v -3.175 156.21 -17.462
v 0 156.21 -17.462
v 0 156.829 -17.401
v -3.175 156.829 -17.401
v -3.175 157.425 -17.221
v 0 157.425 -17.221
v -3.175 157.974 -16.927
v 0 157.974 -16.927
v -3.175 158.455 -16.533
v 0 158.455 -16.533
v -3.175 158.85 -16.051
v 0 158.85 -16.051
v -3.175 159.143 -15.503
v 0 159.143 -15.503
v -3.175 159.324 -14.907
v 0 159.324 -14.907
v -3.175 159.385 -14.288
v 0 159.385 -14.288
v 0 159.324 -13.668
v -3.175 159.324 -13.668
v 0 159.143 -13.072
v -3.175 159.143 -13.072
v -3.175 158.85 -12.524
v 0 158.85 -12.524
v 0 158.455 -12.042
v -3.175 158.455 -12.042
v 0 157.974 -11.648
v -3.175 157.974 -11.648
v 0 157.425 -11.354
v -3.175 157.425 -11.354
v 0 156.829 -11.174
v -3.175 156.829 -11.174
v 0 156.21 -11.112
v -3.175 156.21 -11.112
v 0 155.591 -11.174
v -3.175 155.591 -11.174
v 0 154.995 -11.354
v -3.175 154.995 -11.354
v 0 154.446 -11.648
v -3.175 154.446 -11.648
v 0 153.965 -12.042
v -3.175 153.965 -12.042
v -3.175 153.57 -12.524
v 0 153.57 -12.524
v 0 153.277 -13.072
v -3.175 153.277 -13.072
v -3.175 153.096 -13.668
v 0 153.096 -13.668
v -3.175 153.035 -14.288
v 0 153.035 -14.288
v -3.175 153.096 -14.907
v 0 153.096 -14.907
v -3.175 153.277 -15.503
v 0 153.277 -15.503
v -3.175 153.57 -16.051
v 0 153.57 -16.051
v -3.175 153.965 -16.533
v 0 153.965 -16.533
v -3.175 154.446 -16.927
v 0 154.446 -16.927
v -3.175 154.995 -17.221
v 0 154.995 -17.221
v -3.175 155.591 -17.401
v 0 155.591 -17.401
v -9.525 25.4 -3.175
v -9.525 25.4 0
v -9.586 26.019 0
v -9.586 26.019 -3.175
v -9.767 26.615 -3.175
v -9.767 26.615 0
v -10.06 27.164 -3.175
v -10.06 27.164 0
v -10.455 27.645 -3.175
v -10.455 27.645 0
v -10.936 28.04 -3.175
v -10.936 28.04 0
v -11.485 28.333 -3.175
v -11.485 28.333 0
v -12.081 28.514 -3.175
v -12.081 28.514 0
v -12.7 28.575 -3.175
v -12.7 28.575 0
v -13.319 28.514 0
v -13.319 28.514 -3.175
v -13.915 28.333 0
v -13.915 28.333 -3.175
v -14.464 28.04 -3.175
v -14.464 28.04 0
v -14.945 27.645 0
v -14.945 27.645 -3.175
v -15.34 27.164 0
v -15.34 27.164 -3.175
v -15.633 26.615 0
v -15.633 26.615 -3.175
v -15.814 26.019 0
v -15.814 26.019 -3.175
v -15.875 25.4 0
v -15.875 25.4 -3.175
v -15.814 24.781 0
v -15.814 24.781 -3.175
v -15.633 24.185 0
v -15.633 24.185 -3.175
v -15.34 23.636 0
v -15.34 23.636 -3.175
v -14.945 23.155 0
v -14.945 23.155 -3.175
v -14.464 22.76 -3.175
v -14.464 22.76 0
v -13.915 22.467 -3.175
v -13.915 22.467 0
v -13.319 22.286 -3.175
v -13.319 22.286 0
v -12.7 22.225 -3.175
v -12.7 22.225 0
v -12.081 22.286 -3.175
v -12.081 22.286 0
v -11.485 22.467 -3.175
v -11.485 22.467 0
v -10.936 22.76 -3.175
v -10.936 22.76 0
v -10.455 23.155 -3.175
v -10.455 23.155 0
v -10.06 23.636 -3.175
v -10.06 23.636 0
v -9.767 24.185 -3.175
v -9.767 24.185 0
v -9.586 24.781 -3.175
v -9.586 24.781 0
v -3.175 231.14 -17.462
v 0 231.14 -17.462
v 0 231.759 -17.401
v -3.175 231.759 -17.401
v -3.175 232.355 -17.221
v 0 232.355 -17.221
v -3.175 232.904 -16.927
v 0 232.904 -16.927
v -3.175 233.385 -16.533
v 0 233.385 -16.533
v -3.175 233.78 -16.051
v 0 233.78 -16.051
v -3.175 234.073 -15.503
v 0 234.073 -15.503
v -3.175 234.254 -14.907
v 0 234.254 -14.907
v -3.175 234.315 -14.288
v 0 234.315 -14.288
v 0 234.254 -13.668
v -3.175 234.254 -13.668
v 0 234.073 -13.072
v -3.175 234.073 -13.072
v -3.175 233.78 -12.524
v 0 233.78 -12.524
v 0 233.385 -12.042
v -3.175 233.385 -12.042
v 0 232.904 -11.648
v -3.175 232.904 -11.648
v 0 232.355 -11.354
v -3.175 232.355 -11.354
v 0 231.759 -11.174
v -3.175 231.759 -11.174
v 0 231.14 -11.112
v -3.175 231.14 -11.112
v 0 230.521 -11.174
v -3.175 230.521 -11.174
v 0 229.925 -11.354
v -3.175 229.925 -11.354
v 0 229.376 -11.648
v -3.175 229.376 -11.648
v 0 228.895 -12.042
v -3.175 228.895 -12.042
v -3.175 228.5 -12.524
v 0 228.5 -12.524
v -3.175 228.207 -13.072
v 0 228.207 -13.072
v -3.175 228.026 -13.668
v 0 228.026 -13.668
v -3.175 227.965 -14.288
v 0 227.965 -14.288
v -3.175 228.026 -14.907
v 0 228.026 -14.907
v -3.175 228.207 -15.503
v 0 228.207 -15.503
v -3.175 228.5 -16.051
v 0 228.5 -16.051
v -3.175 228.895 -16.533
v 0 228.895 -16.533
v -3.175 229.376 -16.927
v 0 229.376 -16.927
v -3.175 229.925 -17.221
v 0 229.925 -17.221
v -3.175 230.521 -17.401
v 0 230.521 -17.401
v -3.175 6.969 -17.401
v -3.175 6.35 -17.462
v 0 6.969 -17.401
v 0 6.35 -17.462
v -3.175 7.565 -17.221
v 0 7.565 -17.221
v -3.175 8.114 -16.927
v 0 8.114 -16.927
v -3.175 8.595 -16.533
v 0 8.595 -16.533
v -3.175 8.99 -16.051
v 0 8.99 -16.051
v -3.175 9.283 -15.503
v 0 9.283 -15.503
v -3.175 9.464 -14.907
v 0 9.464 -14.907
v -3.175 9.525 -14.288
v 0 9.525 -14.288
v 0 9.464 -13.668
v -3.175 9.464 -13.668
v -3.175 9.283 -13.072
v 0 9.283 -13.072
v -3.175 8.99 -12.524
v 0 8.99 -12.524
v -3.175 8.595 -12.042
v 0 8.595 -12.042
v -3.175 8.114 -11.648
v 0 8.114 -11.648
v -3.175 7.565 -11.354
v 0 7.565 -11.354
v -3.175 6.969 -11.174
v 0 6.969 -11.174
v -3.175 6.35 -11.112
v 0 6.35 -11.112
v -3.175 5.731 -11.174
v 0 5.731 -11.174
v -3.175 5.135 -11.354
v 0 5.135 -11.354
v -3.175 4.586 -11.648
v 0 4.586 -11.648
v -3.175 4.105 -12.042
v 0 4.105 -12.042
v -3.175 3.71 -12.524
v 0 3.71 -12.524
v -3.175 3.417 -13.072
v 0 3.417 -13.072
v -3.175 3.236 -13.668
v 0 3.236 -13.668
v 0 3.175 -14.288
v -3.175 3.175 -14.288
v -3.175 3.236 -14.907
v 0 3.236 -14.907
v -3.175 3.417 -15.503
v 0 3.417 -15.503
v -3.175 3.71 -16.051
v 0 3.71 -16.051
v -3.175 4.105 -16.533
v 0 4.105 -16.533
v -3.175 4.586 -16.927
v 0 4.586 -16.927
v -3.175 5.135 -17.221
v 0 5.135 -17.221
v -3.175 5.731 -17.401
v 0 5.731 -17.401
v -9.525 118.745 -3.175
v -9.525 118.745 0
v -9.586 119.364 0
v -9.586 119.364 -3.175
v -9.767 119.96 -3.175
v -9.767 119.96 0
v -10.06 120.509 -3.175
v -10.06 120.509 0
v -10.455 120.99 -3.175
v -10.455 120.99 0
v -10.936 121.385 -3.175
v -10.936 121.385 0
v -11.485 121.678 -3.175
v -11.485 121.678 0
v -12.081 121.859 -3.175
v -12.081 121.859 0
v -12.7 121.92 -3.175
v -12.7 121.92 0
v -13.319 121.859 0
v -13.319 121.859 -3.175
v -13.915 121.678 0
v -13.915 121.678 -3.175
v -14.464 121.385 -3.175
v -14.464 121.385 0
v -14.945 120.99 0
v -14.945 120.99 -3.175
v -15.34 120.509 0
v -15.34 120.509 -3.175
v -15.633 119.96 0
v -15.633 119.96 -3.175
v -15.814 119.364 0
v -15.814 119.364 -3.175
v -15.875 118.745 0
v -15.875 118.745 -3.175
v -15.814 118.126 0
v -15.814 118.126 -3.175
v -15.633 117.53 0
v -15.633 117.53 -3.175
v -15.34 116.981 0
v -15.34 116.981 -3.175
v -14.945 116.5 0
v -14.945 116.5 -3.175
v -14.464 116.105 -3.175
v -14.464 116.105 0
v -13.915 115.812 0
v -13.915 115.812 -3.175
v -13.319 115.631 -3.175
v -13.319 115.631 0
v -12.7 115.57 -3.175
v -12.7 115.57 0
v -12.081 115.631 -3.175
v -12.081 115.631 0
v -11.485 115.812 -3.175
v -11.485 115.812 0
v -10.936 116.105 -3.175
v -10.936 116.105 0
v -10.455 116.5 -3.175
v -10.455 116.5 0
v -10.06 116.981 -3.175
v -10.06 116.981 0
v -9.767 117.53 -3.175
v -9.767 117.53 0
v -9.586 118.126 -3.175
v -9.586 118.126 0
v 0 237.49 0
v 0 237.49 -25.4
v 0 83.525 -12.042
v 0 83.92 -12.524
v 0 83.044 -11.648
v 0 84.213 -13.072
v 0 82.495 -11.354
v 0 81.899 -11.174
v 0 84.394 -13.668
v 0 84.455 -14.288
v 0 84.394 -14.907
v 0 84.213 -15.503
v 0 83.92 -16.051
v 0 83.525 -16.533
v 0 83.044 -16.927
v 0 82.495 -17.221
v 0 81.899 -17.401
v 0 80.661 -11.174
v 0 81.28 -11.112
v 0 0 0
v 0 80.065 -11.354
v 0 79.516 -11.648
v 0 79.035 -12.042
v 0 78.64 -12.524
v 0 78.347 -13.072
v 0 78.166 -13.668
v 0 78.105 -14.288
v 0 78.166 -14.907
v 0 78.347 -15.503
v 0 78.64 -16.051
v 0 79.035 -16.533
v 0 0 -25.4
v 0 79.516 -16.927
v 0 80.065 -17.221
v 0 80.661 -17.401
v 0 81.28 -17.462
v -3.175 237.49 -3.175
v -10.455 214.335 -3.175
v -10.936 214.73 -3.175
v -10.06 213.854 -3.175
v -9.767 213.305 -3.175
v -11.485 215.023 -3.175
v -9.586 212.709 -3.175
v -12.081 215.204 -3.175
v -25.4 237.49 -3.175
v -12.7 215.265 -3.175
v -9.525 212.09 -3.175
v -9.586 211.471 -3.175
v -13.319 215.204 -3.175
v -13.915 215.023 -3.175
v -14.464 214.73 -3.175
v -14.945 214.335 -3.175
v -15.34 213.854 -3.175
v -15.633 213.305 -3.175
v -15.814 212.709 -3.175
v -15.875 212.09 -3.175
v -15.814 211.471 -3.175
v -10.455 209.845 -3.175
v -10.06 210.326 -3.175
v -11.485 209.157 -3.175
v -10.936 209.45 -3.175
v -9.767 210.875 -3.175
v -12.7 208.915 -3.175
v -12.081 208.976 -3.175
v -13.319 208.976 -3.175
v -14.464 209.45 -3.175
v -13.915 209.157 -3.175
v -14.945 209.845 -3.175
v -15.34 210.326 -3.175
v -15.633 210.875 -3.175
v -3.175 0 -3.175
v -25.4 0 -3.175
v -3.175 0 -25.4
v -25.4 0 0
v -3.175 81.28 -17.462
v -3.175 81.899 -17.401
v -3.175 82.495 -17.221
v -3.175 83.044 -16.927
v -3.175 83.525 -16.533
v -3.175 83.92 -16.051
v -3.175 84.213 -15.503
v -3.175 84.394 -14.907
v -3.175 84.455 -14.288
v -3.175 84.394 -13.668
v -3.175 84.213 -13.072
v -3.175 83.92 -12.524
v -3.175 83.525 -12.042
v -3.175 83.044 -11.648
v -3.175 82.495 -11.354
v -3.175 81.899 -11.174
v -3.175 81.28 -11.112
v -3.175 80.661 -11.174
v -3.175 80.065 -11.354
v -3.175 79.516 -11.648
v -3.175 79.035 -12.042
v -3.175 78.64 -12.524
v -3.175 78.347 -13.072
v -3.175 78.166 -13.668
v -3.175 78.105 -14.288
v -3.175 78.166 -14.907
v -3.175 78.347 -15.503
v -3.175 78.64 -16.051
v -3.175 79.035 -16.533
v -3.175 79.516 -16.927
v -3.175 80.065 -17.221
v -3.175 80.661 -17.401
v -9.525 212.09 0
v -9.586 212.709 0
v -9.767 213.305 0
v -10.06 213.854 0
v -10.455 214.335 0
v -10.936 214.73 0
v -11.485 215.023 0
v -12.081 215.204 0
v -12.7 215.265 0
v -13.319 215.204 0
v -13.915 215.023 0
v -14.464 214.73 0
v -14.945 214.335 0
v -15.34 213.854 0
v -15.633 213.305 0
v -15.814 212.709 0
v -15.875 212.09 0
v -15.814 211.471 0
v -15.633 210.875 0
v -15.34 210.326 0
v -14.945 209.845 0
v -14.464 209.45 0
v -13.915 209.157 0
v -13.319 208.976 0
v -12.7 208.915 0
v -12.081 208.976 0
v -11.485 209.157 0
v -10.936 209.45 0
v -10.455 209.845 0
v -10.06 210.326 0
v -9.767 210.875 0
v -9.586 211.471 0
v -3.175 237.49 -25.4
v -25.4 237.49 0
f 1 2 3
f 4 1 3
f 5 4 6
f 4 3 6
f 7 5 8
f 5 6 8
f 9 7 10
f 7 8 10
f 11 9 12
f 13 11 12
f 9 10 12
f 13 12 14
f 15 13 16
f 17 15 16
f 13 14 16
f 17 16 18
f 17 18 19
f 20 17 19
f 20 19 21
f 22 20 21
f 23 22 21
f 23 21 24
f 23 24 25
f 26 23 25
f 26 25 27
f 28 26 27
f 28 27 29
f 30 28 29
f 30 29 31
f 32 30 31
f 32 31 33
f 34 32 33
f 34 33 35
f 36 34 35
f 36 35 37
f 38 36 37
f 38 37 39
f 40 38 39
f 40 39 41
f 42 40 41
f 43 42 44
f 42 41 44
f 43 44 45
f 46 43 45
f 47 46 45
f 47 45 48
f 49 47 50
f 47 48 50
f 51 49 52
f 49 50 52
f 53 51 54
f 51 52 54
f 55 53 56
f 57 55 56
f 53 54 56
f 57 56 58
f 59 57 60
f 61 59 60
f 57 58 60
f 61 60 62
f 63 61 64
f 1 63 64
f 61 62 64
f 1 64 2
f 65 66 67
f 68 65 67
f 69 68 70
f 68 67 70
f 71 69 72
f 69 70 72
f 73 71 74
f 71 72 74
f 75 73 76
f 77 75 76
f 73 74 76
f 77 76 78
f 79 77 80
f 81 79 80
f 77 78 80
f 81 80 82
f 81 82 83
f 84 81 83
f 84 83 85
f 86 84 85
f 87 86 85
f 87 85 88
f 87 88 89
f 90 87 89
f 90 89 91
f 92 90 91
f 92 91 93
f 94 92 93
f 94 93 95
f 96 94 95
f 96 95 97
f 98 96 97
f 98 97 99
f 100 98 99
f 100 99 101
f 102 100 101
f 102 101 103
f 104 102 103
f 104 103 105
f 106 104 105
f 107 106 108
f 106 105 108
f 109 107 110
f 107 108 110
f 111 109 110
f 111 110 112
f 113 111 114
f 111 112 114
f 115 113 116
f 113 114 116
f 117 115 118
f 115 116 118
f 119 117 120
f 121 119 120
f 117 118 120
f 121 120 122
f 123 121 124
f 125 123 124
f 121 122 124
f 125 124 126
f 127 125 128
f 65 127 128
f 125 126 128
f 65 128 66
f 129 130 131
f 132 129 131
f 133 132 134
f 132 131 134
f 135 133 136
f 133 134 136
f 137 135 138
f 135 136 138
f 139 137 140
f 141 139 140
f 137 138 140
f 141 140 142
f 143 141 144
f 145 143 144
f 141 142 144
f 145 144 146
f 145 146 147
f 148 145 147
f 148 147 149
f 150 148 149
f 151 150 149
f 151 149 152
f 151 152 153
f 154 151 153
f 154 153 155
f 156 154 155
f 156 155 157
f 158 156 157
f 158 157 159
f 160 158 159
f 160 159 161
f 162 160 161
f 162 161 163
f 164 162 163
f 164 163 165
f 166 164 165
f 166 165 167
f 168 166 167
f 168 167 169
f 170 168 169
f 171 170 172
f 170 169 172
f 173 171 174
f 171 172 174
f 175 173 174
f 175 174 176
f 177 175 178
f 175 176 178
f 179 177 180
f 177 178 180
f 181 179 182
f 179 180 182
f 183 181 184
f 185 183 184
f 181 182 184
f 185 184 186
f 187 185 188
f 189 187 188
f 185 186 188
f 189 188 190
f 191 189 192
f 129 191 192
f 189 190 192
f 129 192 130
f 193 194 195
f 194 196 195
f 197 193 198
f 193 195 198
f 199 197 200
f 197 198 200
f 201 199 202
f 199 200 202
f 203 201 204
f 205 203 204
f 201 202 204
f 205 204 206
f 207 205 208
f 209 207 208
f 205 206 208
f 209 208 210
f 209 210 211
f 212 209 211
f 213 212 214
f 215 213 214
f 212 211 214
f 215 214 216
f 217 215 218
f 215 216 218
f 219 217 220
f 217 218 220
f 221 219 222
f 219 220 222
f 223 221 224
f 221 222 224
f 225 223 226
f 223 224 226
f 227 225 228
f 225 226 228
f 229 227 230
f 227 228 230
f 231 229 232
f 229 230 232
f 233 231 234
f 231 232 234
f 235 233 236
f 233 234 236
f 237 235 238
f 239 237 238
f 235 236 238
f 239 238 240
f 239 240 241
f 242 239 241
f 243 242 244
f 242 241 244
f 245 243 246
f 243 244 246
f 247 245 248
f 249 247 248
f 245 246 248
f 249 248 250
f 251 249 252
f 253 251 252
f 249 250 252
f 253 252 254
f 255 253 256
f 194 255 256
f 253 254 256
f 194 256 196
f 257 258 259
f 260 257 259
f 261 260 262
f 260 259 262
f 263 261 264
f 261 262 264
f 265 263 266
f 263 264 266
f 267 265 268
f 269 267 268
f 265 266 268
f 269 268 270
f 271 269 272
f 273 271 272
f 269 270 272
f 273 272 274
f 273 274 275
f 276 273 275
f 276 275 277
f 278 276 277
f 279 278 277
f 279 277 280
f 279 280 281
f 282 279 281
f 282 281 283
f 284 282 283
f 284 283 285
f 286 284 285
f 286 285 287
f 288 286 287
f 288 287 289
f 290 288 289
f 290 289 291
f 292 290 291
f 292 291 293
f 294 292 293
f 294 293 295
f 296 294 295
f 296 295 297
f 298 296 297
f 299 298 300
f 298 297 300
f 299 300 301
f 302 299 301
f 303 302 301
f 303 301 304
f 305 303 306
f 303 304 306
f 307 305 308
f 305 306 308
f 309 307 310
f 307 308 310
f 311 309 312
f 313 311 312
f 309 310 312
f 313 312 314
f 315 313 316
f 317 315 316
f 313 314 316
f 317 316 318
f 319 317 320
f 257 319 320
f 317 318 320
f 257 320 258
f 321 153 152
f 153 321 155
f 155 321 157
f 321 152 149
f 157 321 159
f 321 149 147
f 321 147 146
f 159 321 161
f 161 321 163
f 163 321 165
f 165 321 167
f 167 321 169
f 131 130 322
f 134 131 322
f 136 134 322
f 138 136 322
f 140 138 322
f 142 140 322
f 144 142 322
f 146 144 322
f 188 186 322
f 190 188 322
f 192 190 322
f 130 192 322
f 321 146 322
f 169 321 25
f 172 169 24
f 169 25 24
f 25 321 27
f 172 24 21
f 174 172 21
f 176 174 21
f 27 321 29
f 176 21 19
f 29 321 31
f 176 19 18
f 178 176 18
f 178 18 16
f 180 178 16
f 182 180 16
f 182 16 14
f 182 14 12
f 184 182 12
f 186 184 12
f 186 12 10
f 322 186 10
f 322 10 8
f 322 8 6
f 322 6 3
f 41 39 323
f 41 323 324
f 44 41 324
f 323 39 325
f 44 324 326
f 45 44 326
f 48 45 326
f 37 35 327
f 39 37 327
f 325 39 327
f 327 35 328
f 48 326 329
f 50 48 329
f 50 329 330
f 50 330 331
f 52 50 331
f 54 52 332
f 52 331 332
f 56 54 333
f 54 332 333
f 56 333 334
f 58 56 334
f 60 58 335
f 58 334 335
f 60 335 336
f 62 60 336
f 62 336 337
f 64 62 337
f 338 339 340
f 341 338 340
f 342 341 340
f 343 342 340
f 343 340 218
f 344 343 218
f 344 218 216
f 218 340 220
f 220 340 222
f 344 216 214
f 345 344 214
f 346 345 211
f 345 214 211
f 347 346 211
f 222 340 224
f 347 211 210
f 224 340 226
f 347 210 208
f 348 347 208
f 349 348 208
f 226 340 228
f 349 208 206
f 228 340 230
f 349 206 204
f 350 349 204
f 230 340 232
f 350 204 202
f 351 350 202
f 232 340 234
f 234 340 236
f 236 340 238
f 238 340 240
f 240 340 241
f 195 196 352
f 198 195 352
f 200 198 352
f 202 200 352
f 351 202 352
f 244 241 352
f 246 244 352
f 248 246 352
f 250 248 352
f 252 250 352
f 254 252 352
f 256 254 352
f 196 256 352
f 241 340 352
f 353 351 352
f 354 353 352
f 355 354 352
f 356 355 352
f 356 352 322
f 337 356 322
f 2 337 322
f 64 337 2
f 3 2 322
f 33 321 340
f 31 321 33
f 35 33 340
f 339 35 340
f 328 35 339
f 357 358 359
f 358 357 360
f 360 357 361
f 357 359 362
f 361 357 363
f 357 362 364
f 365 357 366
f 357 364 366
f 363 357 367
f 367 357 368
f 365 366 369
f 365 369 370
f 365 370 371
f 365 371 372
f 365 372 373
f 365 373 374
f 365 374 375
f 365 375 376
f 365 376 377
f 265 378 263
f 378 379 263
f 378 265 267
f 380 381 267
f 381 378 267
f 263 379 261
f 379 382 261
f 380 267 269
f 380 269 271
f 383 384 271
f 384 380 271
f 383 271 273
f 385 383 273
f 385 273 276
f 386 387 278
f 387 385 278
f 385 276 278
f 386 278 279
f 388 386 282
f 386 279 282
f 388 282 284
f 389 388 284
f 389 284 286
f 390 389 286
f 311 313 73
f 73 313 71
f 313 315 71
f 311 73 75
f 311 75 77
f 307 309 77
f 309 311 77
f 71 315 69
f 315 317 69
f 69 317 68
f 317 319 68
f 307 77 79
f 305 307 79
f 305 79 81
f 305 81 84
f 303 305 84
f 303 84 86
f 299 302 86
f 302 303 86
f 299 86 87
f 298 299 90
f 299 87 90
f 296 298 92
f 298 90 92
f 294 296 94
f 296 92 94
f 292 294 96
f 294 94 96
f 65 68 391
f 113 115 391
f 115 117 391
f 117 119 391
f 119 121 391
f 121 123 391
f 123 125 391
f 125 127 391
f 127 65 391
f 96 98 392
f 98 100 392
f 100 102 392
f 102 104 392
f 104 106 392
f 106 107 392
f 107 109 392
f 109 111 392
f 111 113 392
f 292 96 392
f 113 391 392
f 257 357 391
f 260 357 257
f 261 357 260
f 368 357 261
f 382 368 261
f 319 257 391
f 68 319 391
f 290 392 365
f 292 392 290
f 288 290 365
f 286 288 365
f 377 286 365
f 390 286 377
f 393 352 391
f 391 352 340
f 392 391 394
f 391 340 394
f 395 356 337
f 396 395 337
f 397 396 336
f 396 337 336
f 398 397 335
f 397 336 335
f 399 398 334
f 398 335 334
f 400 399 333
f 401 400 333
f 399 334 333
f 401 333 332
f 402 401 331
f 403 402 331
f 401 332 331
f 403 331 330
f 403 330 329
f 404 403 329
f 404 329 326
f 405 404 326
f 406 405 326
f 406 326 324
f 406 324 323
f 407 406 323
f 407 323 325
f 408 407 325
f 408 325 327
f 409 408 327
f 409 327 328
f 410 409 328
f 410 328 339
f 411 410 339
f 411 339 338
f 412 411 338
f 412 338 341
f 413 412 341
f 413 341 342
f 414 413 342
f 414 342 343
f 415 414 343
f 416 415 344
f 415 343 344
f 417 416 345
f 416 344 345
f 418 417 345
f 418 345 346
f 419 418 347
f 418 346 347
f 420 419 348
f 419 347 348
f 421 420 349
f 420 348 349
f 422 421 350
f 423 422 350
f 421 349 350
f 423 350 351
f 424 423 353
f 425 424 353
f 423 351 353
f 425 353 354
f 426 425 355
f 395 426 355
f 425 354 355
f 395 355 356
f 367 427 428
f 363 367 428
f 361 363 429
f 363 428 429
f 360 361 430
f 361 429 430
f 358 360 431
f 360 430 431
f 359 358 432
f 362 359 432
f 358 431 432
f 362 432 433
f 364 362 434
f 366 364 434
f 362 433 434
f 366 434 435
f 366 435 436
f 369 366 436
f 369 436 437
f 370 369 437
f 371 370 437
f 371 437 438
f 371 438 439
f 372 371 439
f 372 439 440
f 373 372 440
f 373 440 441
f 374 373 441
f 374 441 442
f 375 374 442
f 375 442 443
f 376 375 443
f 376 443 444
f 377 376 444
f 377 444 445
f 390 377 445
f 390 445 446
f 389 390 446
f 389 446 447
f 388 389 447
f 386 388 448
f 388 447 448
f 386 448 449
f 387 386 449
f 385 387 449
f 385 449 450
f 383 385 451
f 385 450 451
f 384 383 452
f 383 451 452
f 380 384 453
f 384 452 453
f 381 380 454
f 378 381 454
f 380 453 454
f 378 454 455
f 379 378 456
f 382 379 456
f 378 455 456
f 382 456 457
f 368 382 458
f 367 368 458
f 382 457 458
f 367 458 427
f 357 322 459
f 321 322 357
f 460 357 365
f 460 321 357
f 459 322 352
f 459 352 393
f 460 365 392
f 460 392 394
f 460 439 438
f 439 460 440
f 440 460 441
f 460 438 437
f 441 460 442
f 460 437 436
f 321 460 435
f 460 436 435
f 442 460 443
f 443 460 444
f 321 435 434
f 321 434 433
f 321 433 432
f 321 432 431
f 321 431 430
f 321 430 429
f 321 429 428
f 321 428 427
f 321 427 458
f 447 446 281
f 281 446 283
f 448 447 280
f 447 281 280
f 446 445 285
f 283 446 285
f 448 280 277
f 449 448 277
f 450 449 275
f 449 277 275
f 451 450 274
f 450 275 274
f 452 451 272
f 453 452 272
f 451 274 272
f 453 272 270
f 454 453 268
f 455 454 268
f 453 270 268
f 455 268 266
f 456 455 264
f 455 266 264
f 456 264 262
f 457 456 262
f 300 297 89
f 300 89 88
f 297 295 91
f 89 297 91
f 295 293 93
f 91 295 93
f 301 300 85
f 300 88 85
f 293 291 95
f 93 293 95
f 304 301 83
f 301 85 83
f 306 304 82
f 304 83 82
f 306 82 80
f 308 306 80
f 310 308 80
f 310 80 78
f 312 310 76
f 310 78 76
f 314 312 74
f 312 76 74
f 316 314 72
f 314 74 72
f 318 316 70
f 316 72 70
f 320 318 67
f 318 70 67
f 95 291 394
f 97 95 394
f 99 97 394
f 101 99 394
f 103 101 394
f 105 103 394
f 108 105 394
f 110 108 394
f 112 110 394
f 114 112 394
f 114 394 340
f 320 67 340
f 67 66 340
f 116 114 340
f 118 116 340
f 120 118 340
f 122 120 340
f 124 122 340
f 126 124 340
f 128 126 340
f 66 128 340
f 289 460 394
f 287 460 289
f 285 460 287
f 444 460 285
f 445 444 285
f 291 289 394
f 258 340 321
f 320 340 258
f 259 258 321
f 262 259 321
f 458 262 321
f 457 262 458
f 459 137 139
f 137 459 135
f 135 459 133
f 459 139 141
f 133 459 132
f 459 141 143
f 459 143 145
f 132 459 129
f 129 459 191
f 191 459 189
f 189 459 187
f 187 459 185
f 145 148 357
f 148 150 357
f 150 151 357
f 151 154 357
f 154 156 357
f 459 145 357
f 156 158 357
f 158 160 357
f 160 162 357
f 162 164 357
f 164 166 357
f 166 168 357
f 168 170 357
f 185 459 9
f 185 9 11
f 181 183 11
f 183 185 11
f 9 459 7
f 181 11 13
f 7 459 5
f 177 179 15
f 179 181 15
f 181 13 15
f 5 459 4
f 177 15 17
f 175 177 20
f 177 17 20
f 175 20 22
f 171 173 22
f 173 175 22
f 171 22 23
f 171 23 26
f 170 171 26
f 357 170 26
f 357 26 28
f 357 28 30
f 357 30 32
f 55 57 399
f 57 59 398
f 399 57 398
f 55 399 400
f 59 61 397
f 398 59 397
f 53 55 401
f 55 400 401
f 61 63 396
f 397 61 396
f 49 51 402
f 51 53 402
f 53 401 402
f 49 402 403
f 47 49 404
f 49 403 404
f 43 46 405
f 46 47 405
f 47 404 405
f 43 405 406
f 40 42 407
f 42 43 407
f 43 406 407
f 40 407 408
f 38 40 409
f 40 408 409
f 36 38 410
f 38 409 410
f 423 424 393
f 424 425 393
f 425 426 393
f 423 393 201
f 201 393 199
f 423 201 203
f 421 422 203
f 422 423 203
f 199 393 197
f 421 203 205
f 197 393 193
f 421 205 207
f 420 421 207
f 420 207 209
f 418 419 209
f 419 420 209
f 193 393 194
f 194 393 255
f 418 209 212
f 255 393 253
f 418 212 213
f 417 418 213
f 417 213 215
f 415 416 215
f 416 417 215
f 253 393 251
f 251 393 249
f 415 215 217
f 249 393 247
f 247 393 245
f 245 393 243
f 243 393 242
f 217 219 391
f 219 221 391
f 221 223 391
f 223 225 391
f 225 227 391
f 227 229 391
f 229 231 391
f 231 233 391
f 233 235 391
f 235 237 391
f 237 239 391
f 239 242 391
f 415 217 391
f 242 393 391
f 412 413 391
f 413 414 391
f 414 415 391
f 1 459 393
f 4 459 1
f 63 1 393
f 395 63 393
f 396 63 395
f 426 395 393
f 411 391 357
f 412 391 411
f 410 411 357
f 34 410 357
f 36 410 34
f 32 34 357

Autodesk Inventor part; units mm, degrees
ref_plane "YZ Plane" through (0, 0, 0) normal (1, 0, 0) x (0, 1, 0)
ref_plane "XZ Plane" through (0, 0, 0) normal (0, 1, 0) x (-1, 0, 0)
ref_plane "XY Plane" through (0, 0, 0) normal (0, 0, 1) x (1, 0, 0)
sketch "Sketch1" plane through (0, 0, 0) normal (0, 1, 0) x (-1, 0, 0)
  line L0 (0, 0) -> (0, -25.4)
  line L1 (0, -25.4) -> (3.175, -25.4)
  line L2 (3.175, -25.4) -> (3.175, -3.175)
  line L3 (3.175, -3.175) -> (25.4, -3.175)
  line L4 (25.4, -3.175) -> (25.4, 0)
  line L5 (25.4, 0) -> (0, 0)
  dimension "d0" = 25.4
  dimension "d1" = 3.175
  dimension "d2" = 22.225
  dimension "d3" = 22.225
extrude "Extrusion1" add sketch "Sketch1" along normal blind 237.49
sketch "Sketch4" plane through (0, 0, 0) normal (1, 0, 0) x (0, 0, -1)
  line L0 (25.4, 0) -> (3.175, 0) projected
  line L1 (25.4, 237.49) -> (3.175, 237.49) projected
  circle A0 centre (14.2875, 231.14) radius 3.175
  circle A1 centre (14.2875, 6.35) radius 3.175
  circle A2 centre (14.2875, 156.21) radius 3.175
  circle A3 centre (14.2875, 81.28) radius 3.175
  point P0 (0, 0)
  dimension "d23" = 6.35
  dimension "d26" = 6.35
  dimension "d27" = 6.35
extrude "Extrusion4" cut sketch "Sketch4" against normal blind 237.49
sketch "Sketch5" plane through (-25.4, 0, 0) normal (0, 0, 1) x (1, 0, 0)
  line L0 (0, 0) -> (25.4, 0) projected
  line L1 (22.225, 237.49) -> (0, 237.49) projected
  circle A0 centre (12.7, 212.09) radius 3.175
  circle A1 centre (12.7, 118.745) radius 3.175
  circle A2 centre (12.7, 25.4) radius 3.175
  dimension "d32" = 6.35
  dimension "d33" = 6.35
  dimension "d34" = 6.35
extrude "Extrusion5" cut sketch "Sketch5" against normal blind 237.49
properties part number "Cylinder Bracket"
